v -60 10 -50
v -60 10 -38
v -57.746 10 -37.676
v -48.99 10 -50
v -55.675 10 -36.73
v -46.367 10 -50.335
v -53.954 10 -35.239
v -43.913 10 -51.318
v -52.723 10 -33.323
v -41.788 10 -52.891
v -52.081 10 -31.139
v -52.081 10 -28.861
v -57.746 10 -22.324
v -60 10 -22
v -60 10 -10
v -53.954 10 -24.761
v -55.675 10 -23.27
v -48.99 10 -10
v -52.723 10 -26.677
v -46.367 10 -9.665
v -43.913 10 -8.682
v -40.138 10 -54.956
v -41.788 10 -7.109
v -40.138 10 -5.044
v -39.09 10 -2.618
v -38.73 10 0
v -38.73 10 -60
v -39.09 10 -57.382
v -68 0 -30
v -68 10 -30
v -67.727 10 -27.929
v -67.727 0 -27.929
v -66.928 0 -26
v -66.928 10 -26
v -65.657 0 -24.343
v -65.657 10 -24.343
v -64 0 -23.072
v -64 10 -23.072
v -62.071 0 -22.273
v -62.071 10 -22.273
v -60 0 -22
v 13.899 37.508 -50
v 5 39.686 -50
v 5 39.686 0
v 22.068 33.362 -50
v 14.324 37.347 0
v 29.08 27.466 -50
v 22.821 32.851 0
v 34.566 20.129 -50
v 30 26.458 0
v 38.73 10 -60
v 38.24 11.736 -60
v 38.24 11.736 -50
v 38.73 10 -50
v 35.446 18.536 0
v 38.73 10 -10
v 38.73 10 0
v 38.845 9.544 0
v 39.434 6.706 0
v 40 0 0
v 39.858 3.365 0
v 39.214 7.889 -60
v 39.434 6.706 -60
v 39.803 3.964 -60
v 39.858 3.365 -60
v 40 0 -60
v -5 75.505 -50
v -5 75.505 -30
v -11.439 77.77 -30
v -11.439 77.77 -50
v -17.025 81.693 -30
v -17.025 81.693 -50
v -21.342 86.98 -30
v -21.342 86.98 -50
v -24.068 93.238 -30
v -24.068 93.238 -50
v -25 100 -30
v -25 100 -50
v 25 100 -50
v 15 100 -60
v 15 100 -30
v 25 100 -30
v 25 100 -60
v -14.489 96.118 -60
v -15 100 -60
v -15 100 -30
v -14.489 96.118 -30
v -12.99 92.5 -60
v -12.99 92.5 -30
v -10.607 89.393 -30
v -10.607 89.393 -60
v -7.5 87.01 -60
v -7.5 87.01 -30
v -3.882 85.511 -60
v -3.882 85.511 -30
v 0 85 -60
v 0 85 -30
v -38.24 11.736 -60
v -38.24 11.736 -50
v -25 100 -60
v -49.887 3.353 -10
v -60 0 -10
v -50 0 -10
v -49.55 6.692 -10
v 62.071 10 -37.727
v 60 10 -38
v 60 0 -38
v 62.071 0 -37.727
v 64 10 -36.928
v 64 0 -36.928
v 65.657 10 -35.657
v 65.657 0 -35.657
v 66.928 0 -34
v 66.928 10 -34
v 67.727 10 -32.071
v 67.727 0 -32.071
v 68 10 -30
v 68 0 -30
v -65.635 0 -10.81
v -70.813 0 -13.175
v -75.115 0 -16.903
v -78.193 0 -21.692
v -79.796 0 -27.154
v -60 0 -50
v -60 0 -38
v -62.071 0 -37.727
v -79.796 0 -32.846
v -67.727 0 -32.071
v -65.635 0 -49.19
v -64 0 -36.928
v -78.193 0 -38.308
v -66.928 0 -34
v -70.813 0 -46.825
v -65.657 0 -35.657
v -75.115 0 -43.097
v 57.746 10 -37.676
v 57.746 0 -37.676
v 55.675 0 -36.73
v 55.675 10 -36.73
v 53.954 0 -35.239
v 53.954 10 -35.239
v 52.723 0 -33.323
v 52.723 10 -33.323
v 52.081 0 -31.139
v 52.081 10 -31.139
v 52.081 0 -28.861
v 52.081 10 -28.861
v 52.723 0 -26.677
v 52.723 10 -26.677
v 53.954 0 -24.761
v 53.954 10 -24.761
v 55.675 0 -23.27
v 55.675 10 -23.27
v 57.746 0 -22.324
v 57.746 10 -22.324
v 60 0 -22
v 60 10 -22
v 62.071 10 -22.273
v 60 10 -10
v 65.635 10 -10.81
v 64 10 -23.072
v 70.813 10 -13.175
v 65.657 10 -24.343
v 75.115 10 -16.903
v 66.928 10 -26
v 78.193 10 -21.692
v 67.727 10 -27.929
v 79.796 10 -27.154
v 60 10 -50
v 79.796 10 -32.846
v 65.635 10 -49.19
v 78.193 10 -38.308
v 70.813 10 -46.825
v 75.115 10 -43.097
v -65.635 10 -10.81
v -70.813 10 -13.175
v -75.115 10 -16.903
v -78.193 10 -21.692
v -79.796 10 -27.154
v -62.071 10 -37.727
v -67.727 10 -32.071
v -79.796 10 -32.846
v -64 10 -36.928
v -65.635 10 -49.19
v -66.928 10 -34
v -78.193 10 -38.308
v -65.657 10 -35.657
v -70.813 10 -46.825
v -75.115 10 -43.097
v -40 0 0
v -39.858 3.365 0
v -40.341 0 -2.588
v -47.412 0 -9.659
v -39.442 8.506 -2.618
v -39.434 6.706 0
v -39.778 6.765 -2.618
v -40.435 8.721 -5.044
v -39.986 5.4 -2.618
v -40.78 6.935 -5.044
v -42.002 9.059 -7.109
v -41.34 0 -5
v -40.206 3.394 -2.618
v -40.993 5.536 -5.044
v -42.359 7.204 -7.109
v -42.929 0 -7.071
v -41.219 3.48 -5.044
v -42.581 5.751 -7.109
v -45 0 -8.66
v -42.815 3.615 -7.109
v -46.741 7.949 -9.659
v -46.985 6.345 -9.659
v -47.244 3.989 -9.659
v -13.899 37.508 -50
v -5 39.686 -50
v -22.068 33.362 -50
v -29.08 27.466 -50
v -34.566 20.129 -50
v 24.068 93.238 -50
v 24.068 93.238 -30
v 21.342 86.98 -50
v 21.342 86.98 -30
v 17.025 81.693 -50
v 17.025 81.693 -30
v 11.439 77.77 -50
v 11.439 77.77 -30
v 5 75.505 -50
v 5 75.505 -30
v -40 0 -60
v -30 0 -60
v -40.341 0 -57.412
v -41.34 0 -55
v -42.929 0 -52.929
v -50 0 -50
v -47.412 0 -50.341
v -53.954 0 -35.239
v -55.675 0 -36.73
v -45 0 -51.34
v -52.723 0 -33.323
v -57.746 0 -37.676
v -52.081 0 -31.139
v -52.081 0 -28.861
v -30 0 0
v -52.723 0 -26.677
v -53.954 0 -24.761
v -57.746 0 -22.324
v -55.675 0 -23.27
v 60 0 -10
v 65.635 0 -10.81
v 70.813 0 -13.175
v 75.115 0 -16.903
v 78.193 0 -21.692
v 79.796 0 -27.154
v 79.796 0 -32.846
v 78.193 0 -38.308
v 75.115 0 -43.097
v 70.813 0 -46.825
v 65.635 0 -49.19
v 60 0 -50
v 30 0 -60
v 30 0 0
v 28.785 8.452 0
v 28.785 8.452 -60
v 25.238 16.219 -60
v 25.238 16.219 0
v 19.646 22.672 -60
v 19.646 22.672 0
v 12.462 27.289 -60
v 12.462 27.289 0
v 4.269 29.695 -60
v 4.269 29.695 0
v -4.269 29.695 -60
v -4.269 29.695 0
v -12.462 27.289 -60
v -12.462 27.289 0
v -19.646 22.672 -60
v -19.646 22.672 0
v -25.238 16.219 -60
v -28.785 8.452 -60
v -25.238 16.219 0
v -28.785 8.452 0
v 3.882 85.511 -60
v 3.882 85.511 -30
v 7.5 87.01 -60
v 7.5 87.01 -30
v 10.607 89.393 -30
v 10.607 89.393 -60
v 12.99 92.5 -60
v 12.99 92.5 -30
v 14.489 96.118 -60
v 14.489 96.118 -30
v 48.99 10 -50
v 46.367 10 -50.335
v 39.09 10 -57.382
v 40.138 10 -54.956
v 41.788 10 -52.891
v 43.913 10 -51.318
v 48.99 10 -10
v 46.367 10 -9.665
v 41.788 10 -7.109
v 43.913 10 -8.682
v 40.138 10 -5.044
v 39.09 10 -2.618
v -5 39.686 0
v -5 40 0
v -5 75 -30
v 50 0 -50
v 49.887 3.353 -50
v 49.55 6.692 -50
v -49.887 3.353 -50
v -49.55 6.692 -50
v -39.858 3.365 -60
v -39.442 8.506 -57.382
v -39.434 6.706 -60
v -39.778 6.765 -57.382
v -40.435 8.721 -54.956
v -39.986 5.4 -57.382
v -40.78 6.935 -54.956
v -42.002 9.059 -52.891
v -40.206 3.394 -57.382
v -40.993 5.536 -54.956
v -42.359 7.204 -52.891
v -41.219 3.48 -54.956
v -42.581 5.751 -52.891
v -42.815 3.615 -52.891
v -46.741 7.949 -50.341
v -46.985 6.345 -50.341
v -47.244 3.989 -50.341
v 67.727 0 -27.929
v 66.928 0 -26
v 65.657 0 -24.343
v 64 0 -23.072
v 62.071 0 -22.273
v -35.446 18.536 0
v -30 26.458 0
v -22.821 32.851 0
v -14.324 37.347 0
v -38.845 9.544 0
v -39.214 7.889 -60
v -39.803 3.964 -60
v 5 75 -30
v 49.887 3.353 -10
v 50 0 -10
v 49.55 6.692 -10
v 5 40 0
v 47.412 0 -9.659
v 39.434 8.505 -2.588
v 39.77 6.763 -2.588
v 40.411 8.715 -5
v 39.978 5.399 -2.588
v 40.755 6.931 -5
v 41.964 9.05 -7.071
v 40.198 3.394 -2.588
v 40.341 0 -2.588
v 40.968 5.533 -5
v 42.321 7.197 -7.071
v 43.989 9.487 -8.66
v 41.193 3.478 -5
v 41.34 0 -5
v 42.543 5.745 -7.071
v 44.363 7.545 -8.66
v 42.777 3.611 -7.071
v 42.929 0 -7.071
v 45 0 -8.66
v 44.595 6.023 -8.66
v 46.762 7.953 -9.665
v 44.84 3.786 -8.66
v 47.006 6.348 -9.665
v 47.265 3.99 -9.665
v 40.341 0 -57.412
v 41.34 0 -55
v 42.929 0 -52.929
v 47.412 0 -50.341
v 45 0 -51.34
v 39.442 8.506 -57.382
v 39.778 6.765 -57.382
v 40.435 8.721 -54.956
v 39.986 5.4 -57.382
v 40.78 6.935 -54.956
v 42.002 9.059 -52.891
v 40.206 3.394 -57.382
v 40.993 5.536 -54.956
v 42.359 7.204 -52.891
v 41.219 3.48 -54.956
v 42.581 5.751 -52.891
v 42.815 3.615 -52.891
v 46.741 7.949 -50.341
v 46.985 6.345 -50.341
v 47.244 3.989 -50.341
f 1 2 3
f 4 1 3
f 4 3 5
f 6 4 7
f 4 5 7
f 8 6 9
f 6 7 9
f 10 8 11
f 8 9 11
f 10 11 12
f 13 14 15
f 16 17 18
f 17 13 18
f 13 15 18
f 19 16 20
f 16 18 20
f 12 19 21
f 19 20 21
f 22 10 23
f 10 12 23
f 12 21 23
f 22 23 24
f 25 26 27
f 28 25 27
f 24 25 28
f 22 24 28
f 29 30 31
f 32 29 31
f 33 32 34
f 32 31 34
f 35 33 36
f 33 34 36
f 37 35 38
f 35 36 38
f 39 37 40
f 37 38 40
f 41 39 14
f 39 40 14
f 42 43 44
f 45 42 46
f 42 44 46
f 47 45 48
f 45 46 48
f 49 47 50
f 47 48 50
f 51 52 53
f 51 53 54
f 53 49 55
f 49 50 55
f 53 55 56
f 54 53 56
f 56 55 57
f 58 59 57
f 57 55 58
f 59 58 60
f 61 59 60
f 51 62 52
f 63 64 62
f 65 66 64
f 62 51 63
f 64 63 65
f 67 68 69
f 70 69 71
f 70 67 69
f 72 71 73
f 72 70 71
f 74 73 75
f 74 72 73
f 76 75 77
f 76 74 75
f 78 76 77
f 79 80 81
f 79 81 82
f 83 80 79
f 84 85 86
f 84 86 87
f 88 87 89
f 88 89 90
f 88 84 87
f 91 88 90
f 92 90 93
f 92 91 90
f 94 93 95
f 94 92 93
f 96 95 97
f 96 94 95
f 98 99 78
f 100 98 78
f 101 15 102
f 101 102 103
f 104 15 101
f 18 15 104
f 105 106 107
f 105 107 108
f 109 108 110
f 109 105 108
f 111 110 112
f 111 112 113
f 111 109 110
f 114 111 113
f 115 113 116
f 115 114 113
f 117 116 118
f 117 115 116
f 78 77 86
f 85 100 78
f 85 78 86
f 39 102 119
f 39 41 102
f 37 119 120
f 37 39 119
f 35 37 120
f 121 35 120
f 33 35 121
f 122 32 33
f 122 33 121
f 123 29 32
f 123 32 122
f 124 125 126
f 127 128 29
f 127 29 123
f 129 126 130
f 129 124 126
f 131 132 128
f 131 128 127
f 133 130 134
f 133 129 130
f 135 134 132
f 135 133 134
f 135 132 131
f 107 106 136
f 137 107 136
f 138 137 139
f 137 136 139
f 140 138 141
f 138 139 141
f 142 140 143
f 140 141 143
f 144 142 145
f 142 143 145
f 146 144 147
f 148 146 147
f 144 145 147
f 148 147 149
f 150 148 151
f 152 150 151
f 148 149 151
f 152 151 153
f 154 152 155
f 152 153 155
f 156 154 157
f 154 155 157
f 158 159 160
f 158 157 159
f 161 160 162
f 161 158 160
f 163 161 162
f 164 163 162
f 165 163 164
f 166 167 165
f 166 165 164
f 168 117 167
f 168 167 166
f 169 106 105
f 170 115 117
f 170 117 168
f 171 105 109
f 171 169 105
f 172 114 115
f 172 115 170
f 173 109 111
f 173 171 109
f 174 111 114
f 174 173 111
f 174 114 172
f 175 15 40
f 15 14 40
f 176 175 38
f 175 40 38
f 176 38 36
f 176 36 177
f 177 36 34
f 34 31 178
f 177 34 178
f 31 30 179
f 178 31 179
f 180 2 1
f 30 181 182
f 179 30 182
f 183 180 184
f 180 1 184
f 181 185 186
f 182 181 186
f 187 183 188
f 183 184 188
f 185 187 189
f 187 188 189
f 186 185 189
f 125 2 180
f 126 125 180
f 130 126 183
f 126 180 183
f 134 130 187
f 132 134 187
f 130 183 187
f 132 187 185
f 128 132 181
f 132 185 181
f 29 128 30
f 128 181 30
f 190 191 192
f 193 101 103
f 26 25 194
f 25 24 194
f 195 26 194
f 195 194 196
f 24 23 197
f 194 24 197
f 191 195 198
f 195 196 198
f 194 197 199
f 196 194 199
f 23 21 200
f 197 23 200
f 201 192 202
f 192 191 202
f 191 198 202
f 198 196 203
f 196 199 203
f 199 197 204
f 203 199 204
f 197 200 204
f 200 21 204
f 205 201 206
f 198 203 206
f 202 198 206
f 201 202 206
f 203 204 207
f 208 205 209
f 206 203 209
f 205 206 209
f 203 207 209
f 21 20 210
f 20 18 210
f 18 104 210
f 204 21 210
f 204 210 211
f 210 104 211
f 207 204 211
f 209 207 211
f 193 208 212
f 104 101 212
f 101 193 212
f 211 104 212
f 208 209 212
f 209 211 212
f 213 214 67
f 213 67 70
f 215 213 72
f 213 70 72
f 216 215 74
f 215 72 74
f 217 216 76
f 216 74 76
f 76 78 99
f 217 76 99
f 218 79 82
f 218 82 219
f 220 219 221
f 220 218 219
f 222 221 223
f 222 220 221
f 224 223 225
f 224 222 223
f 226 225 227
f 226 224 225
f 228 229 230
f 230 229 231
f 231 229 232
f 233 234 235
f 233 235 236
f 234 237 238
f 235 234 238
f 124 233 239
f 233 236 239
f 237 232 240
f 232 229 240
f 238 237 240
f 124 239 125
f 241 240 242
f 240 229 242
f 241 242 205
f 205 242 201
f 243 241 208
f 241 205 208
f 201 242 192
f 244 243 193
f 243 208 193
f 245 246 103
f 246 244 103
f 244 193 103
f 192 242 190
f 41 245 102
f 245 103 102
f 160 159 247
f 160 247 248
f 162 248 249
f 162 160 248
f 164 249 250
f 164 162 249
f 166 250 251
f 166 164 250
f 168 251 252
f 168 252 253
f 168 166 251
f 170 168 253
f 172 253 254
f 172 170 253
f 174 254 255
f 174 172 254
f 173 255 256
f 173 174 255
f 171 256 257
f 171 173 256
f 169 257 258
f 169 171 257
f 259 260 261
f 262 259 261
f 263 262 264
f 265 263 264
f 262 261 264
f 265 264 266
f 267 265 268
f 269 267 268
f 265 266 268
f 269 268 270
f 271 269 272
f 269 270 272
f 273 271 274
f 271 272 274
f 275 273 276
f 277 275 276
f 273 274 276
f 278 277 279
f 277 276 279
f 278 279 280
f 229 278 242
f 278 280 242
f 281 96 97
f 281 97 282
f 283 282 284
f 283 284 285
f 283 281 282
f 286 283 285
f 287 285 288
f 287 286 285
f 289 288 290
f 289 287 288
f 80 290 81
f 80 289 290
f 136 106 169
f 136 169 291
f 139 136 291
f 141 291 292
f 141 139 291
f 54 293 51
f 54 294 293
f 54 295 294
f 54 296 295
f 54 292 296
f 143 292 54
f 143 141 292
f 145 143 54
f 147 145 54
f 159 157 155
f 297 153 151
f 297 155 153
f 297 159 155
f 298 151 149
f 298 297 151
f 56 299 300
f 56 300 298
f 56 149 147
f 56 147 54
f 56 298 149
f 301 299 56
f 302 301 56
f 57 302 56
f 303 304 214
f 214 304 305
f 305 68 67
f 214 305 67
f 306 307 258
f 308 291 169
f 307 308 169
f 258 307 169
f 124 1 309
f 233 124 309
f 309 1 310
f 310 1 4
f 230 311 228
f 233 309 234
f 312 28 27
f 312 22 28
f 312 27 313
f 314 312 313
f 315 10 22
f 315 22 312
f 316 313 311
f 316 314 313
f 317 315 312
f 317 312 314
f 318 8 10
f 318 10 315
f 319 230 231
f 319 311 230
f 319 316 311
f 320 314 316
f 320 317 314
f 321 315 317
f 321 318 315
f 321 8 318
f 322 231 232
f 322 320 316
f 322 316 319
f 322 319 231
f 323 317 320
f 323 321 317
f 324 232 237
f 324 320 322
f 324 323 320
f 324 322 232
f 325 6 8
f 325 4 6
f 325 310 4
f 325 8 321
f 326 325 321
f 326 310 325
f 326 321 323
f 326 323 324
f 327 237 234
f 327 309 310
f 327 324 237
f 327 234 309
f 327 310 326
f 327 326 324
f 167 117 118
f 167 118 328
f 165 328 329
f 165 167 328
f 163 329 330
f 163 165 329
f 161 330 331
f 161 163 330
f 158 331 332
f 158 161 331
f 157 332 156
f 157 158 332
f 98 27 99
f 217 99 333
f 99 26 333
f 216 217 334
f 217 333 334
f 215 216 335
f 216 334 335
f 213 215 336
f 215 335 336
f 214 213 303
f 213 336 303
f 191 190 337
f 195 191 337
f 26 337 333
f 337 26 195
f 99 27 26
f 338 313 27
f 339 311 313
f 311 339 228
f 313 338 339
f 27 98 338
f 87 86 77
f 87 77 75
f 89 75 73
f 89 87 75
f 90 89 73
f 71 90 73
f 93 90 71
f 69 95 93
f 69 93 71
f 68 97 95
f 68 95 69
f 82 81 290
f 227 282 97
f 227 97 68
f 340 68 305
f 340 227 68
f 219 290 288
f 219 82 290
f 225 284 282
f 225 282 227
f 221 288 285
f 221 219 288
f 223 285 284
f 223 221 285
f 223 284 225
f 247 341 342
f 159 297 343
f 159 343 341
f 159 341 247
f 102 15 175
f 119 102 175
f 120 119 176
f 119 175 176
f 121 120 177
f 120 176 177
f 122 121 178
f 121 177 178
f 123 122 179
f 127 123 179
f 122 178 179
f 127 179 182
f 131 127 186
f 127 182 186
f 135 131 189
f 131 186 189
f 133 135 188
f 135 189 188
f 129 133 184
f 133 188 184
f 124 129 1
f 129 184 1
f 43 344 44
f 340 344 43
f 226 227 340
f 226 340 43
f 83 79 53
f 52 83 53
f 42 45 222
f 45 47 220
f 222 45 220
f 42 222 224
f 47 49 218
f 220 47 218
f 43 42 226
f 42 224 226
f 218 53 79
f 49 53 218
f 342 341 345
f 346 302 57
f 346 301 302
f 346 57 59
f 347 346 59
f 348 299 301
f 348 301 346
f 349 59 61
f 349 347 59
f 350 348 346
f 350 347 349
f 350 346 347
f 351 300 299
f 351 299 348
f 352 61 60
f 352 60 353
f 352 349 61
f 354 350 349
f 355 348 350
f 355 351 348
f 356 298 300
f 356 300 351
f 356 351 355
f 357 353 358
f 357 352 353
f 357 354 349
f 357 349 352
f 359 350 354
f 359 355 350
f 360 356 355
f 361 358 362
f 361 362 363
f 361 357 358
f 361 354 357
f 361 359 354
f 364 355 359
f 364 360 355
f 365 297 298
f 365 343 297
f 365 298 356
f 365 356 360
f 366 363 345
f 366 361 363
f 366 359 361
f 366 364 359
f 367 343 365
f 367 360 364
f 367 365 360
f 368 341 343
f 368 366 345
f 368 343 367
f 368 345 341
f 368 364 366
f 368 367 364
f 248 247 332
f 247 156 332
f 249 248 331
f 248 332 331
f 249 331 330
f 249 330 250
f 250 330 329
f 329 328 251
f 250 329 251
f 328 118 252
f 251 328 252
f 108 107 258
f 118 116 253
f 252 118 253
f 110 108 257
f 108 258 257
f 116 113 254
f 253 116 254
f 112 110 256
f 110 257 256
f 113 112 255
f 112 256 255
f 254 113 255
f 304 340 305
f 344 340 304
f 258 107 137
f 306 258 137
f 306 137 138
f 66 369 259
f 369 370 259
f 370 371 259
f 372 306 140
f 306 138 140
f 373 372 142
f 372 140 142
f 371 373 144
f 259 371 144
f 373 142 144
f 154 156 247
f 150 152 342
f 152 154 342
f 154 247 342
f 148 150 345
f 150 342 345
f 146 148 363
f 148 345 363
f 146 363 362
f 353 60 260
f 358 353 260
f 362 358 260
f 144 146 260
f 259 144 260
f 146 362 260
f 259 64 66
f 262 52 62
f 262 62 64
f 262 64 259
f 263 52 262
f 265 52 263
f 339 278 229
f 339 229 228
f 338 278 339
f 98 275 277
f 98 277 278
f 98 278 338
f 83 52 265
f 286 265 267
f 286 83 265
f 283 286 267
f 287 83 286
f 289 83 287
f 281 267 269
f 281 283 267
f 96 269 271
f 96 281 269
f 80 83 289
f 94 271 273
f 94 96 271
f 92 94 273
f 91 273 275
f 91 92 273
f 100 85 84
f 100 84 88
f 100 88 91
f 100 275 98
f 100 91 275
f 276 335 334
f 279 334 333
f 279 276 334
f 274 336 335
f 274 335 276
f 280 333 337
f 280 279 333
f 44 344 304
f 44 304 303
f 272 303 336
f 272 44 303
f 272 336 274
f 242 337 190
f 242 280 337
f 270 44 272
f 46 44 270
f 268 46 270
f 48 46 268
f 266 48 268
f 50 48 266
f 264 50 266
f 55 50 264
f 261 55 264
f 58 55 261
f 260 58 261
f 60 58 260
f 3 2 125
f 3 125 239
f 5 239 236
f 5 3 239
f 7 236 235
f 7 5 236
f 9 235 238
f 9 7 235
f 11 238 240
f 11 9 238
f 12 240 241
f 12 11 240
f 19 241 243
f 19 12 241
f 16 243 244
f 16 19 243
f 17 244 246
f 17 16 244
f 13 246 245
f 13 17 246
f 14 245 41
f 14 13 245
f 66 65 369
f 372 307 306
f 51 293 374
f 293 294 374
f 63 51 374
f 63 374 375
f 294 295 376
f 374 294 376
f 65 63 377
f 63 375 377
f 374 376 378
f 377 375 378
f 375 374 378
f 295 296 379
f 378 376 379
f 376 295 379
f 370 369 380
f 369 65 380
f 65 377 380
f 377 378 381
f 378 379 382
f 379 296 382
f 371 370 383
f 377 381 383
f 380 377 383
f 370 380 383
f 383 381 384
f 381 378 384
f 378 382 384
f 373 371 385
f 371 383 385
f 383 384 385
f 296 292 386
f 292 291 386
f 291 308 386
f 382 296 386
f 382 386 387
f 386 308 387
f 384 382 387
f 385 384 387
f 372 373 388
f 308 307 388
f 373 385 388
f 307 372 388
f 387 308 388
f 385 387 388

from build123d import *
from build123d.topology import SkipClean

# Parameters (mm, degrees)
BOSS_EXTRUDE1_START   = -10
BOSS_EXTRUDE1_DEPTH   = 40
SKETCH1_W             = 30
SKETCH1_H             = 10
BOSS_EXTRUDE1_2_DEPTH = 40
EXTRUDE_THIN1_DEPTH   = 60
BOSS_EXTRUDE2_DEPTH   = 30
BOSS_EXTRUDE3_START   = -10
BOSS_EXTRUDE3_DEPTH   = 10
FILLET2_R             = 10
BOSS_EXTRUDE4_DEPTH   = 5
CUT_EXTRUDE1_DEPTH    = 124.693168817
BOSS_EXTRUDE6_DEPTH   = 10


with BuildPart() as part:
    # Sketch1 → Boss-Extrude1 (new body)
    with BuildSketch(Plane.XY.offset(BOSS_EXTRUDE1_START)):
        with BuildLine():
            Line((60, 10), (38.729833462, 10))
            ThreePointArc((38.729833462, 10), (39.681187851, 5.040171699), (40, 0))
            Line((40, 0), (60, 0))
            Line((60, 0), (60, 10))
        make_face()
    extrude(amount=-BOSS_EXTRUDE1_DEPTH)



with BuildPart() as body_2:
    # Sketch1 → Boss-Extrude1 2 (new body)
    with BuildSketch(Plane.XY.offset(BOSS_EXTRUDE1_START)):
        with Locations((-45, 5)):
            Rectangle(SKETCH1_W, SKETCH1_H)
    extrude(amount=-BOSS_EXTRUDE1_2_DEPTH)


with BuildPart() as part_1:
    add(part.part)

    add(body_2.part)  # Extrude-Thin1 merges body 2
    # Sketch1<3> → Extrude-Thin1 (add)
    with BuildSketch(Plane.XY):
        with BuildLine():
            ThreePointArc((30, 0), (0, 30), (-30, 0))
            Line((-30, 0), (-40, 0))
            ThreePointArc((-40, 0), (0, 40), (40, 0))
            Line((40, 0), (30, 0))
        make_face()
    extrude(amount=-EXTRUDE_THIN1_DEPTH)



with BuildPart() as body_2_2:
    # Sketch2 → Boss-Extrude2 (new body)
    with BuildSketch(Plane(origin=(0, 0, -60), x_dir=(-1, 0, 0), z_dir=(0, 0, -1))):
        with BuildLine():
            ThreePointArc((-25, 100), (-17.67766953, 82.32233047), (0, 75))
            Line((0, 75), (0, 85))
            ThreePointArc((0, 85), (-10.606601718, 89.393398282), (-15, 100))
            Line((-15, 100), (-25, 100))
        make_face()
        with BuildLine():
            Line((0, 85), (0, 75))
            ThreePointArc((0, 75), (17.67766953, 82.32233047), (25, 100))
            Line((25, 100), (15, 100))
            ThreePointArc((15, 100), (10.606601718, 89.393398282), (0, 85))
        make_face()
    extrude(amount=-BOSS_EXTRUDE2_DEPTH)


with BuildPart() as part_2:
    add(part_1.part)

    add(body_2_2.part)  # Boss-Extrude3 merges body 2 2
    # Sketch2<5> → Boss-Extrude3 (add)
    with BuildSketch(Plane(origin=(0, 0, -60), x_dir=(-1, 0, 0), z_dir=(0, 0, -1)).offset(BOSS_EXTRUDE3_START)):
        with BuildLine():
            ThreePointArc((-38.239608802, 11.73594132), (-23.775642443, 32.167045659), (0, 40))
            Line((0, 40), (0, 75))
            ThreePointArc((0, 75), (-17.67766953, 82.32233047), (-25, 100))
            Line((-25, 100), (-38.239608802, 11.73594132))
        make_face()
        with BuildLine():
            Line((0, 75), (0, 40))
            ThreePointArc((0, 40), (23.775642443, 32.167045659), (38.239608802, 11.73594132))
            Line((38.239608802, 11.73594132), (25, 100))
            ThreePointArc((25, 100), (17.67766953, 82.32233047), (0, 75))
        make_face()
    extrude(amount=BOSS_EXTRUDE3_DEPTH)

    # Fillet2
    fillet2_edges = [part_2.edges().sort_by_distance(p)[0] for p in [
        (39.681187851, 5.040171699, -50),
        (-39.681187851, 5.040171699, -50),
        (-39.681187851, 5.040171699, -10),
        (39.681187851, 5.040171699, -10),
    ]]
    fillet(fillet2_edges, radius=FILLET2_R - 0.0001)  # a hair under: the kernel refuses the full size

    # Sketch3 → Boss-Extrude4 (add, symmetric)
    with BuildSketch(Plane(origin=(0, 0, 0), x_dir=(0, 0, -1), z_dir=(1, 0, 0))):
        Polygon((30, 75), (0, 40), (0, 37.743013402), (50.362835489, 37.743013402), (50.362835489, 76.354795309), (30, 76.354795309), align=None)
    extrude(amount=BOSS_EXTRUDE4_DEPTH, both=True)

    # Sketch4 → Cut-Extrude1 (cut, through all)
    with BuildSketch(Plane(origin=(0, 10, 0), x_dir=(1, 0, 0), z_dir=(0, 1, 0))):
        with BuildLine():
            Line((60, 22), (60, 38))
            ThreePointArc((60, 38), (52, 30), (60, 22))
        make_face()
        with BuildLine():
            ThreePointArc((68, 30), (65.656854249, 35.656854249), (60, 38))
            Line((60, 38), (60, 22))
            ThreePointArc((60, 22), (65.656854249, 24.343145751), (68, 30))
        make_face()
    cut_extrude1 = extrude(amount=-CUT_EXTRUDE1_DEPTH, mode=Mode.SUBTRACT)

    # Sketch4<7> → Boss-Extrude6 (add)
    with SkipClean():  # the faces are left unmerged after this step: merging them gives an invalid solid
        with BuildSketch(Plane(origin=(0, 10, 0), x_dir=(1, 0, 0), z_dir=(0, 1, 0))):
            with BuildLine():
                ThreePointArc((60, 10), (80, 30), (60, 50))
                Line((60, 50), (60, 38))
                ThreePointArc((60, 38), (65.656854249, 35.656854249), (68, 30))
                ThreePointArc((68, 30), (65.656854249, 24.343145751), (60, 22))
                Line((60, 22), (60, 10))
            make_face()
        boss_extrude6 = extrude(amount=-BOSS_EXTRUDE6_DEPTH)

    # Mirror1: Cut-Extrude1, Boss-Extrude6 across plane
    with SkipClean():  # the faces are left unmerged after this step: merging them gives an invalid solid
        add(cut_extrude1.mirror(Plane(origin=(0, 0, 0), x_dir=(0, 0, 1), z_dir=(1, 0, 0))), mode=Mode.SUBTRACT)
        add(boss_extrude6.mirror(Plane(origin=(0, 0, 0), x_dir=(0, 0, 1), z_dir=(1, 0, 0))))


solid = part_2.part
